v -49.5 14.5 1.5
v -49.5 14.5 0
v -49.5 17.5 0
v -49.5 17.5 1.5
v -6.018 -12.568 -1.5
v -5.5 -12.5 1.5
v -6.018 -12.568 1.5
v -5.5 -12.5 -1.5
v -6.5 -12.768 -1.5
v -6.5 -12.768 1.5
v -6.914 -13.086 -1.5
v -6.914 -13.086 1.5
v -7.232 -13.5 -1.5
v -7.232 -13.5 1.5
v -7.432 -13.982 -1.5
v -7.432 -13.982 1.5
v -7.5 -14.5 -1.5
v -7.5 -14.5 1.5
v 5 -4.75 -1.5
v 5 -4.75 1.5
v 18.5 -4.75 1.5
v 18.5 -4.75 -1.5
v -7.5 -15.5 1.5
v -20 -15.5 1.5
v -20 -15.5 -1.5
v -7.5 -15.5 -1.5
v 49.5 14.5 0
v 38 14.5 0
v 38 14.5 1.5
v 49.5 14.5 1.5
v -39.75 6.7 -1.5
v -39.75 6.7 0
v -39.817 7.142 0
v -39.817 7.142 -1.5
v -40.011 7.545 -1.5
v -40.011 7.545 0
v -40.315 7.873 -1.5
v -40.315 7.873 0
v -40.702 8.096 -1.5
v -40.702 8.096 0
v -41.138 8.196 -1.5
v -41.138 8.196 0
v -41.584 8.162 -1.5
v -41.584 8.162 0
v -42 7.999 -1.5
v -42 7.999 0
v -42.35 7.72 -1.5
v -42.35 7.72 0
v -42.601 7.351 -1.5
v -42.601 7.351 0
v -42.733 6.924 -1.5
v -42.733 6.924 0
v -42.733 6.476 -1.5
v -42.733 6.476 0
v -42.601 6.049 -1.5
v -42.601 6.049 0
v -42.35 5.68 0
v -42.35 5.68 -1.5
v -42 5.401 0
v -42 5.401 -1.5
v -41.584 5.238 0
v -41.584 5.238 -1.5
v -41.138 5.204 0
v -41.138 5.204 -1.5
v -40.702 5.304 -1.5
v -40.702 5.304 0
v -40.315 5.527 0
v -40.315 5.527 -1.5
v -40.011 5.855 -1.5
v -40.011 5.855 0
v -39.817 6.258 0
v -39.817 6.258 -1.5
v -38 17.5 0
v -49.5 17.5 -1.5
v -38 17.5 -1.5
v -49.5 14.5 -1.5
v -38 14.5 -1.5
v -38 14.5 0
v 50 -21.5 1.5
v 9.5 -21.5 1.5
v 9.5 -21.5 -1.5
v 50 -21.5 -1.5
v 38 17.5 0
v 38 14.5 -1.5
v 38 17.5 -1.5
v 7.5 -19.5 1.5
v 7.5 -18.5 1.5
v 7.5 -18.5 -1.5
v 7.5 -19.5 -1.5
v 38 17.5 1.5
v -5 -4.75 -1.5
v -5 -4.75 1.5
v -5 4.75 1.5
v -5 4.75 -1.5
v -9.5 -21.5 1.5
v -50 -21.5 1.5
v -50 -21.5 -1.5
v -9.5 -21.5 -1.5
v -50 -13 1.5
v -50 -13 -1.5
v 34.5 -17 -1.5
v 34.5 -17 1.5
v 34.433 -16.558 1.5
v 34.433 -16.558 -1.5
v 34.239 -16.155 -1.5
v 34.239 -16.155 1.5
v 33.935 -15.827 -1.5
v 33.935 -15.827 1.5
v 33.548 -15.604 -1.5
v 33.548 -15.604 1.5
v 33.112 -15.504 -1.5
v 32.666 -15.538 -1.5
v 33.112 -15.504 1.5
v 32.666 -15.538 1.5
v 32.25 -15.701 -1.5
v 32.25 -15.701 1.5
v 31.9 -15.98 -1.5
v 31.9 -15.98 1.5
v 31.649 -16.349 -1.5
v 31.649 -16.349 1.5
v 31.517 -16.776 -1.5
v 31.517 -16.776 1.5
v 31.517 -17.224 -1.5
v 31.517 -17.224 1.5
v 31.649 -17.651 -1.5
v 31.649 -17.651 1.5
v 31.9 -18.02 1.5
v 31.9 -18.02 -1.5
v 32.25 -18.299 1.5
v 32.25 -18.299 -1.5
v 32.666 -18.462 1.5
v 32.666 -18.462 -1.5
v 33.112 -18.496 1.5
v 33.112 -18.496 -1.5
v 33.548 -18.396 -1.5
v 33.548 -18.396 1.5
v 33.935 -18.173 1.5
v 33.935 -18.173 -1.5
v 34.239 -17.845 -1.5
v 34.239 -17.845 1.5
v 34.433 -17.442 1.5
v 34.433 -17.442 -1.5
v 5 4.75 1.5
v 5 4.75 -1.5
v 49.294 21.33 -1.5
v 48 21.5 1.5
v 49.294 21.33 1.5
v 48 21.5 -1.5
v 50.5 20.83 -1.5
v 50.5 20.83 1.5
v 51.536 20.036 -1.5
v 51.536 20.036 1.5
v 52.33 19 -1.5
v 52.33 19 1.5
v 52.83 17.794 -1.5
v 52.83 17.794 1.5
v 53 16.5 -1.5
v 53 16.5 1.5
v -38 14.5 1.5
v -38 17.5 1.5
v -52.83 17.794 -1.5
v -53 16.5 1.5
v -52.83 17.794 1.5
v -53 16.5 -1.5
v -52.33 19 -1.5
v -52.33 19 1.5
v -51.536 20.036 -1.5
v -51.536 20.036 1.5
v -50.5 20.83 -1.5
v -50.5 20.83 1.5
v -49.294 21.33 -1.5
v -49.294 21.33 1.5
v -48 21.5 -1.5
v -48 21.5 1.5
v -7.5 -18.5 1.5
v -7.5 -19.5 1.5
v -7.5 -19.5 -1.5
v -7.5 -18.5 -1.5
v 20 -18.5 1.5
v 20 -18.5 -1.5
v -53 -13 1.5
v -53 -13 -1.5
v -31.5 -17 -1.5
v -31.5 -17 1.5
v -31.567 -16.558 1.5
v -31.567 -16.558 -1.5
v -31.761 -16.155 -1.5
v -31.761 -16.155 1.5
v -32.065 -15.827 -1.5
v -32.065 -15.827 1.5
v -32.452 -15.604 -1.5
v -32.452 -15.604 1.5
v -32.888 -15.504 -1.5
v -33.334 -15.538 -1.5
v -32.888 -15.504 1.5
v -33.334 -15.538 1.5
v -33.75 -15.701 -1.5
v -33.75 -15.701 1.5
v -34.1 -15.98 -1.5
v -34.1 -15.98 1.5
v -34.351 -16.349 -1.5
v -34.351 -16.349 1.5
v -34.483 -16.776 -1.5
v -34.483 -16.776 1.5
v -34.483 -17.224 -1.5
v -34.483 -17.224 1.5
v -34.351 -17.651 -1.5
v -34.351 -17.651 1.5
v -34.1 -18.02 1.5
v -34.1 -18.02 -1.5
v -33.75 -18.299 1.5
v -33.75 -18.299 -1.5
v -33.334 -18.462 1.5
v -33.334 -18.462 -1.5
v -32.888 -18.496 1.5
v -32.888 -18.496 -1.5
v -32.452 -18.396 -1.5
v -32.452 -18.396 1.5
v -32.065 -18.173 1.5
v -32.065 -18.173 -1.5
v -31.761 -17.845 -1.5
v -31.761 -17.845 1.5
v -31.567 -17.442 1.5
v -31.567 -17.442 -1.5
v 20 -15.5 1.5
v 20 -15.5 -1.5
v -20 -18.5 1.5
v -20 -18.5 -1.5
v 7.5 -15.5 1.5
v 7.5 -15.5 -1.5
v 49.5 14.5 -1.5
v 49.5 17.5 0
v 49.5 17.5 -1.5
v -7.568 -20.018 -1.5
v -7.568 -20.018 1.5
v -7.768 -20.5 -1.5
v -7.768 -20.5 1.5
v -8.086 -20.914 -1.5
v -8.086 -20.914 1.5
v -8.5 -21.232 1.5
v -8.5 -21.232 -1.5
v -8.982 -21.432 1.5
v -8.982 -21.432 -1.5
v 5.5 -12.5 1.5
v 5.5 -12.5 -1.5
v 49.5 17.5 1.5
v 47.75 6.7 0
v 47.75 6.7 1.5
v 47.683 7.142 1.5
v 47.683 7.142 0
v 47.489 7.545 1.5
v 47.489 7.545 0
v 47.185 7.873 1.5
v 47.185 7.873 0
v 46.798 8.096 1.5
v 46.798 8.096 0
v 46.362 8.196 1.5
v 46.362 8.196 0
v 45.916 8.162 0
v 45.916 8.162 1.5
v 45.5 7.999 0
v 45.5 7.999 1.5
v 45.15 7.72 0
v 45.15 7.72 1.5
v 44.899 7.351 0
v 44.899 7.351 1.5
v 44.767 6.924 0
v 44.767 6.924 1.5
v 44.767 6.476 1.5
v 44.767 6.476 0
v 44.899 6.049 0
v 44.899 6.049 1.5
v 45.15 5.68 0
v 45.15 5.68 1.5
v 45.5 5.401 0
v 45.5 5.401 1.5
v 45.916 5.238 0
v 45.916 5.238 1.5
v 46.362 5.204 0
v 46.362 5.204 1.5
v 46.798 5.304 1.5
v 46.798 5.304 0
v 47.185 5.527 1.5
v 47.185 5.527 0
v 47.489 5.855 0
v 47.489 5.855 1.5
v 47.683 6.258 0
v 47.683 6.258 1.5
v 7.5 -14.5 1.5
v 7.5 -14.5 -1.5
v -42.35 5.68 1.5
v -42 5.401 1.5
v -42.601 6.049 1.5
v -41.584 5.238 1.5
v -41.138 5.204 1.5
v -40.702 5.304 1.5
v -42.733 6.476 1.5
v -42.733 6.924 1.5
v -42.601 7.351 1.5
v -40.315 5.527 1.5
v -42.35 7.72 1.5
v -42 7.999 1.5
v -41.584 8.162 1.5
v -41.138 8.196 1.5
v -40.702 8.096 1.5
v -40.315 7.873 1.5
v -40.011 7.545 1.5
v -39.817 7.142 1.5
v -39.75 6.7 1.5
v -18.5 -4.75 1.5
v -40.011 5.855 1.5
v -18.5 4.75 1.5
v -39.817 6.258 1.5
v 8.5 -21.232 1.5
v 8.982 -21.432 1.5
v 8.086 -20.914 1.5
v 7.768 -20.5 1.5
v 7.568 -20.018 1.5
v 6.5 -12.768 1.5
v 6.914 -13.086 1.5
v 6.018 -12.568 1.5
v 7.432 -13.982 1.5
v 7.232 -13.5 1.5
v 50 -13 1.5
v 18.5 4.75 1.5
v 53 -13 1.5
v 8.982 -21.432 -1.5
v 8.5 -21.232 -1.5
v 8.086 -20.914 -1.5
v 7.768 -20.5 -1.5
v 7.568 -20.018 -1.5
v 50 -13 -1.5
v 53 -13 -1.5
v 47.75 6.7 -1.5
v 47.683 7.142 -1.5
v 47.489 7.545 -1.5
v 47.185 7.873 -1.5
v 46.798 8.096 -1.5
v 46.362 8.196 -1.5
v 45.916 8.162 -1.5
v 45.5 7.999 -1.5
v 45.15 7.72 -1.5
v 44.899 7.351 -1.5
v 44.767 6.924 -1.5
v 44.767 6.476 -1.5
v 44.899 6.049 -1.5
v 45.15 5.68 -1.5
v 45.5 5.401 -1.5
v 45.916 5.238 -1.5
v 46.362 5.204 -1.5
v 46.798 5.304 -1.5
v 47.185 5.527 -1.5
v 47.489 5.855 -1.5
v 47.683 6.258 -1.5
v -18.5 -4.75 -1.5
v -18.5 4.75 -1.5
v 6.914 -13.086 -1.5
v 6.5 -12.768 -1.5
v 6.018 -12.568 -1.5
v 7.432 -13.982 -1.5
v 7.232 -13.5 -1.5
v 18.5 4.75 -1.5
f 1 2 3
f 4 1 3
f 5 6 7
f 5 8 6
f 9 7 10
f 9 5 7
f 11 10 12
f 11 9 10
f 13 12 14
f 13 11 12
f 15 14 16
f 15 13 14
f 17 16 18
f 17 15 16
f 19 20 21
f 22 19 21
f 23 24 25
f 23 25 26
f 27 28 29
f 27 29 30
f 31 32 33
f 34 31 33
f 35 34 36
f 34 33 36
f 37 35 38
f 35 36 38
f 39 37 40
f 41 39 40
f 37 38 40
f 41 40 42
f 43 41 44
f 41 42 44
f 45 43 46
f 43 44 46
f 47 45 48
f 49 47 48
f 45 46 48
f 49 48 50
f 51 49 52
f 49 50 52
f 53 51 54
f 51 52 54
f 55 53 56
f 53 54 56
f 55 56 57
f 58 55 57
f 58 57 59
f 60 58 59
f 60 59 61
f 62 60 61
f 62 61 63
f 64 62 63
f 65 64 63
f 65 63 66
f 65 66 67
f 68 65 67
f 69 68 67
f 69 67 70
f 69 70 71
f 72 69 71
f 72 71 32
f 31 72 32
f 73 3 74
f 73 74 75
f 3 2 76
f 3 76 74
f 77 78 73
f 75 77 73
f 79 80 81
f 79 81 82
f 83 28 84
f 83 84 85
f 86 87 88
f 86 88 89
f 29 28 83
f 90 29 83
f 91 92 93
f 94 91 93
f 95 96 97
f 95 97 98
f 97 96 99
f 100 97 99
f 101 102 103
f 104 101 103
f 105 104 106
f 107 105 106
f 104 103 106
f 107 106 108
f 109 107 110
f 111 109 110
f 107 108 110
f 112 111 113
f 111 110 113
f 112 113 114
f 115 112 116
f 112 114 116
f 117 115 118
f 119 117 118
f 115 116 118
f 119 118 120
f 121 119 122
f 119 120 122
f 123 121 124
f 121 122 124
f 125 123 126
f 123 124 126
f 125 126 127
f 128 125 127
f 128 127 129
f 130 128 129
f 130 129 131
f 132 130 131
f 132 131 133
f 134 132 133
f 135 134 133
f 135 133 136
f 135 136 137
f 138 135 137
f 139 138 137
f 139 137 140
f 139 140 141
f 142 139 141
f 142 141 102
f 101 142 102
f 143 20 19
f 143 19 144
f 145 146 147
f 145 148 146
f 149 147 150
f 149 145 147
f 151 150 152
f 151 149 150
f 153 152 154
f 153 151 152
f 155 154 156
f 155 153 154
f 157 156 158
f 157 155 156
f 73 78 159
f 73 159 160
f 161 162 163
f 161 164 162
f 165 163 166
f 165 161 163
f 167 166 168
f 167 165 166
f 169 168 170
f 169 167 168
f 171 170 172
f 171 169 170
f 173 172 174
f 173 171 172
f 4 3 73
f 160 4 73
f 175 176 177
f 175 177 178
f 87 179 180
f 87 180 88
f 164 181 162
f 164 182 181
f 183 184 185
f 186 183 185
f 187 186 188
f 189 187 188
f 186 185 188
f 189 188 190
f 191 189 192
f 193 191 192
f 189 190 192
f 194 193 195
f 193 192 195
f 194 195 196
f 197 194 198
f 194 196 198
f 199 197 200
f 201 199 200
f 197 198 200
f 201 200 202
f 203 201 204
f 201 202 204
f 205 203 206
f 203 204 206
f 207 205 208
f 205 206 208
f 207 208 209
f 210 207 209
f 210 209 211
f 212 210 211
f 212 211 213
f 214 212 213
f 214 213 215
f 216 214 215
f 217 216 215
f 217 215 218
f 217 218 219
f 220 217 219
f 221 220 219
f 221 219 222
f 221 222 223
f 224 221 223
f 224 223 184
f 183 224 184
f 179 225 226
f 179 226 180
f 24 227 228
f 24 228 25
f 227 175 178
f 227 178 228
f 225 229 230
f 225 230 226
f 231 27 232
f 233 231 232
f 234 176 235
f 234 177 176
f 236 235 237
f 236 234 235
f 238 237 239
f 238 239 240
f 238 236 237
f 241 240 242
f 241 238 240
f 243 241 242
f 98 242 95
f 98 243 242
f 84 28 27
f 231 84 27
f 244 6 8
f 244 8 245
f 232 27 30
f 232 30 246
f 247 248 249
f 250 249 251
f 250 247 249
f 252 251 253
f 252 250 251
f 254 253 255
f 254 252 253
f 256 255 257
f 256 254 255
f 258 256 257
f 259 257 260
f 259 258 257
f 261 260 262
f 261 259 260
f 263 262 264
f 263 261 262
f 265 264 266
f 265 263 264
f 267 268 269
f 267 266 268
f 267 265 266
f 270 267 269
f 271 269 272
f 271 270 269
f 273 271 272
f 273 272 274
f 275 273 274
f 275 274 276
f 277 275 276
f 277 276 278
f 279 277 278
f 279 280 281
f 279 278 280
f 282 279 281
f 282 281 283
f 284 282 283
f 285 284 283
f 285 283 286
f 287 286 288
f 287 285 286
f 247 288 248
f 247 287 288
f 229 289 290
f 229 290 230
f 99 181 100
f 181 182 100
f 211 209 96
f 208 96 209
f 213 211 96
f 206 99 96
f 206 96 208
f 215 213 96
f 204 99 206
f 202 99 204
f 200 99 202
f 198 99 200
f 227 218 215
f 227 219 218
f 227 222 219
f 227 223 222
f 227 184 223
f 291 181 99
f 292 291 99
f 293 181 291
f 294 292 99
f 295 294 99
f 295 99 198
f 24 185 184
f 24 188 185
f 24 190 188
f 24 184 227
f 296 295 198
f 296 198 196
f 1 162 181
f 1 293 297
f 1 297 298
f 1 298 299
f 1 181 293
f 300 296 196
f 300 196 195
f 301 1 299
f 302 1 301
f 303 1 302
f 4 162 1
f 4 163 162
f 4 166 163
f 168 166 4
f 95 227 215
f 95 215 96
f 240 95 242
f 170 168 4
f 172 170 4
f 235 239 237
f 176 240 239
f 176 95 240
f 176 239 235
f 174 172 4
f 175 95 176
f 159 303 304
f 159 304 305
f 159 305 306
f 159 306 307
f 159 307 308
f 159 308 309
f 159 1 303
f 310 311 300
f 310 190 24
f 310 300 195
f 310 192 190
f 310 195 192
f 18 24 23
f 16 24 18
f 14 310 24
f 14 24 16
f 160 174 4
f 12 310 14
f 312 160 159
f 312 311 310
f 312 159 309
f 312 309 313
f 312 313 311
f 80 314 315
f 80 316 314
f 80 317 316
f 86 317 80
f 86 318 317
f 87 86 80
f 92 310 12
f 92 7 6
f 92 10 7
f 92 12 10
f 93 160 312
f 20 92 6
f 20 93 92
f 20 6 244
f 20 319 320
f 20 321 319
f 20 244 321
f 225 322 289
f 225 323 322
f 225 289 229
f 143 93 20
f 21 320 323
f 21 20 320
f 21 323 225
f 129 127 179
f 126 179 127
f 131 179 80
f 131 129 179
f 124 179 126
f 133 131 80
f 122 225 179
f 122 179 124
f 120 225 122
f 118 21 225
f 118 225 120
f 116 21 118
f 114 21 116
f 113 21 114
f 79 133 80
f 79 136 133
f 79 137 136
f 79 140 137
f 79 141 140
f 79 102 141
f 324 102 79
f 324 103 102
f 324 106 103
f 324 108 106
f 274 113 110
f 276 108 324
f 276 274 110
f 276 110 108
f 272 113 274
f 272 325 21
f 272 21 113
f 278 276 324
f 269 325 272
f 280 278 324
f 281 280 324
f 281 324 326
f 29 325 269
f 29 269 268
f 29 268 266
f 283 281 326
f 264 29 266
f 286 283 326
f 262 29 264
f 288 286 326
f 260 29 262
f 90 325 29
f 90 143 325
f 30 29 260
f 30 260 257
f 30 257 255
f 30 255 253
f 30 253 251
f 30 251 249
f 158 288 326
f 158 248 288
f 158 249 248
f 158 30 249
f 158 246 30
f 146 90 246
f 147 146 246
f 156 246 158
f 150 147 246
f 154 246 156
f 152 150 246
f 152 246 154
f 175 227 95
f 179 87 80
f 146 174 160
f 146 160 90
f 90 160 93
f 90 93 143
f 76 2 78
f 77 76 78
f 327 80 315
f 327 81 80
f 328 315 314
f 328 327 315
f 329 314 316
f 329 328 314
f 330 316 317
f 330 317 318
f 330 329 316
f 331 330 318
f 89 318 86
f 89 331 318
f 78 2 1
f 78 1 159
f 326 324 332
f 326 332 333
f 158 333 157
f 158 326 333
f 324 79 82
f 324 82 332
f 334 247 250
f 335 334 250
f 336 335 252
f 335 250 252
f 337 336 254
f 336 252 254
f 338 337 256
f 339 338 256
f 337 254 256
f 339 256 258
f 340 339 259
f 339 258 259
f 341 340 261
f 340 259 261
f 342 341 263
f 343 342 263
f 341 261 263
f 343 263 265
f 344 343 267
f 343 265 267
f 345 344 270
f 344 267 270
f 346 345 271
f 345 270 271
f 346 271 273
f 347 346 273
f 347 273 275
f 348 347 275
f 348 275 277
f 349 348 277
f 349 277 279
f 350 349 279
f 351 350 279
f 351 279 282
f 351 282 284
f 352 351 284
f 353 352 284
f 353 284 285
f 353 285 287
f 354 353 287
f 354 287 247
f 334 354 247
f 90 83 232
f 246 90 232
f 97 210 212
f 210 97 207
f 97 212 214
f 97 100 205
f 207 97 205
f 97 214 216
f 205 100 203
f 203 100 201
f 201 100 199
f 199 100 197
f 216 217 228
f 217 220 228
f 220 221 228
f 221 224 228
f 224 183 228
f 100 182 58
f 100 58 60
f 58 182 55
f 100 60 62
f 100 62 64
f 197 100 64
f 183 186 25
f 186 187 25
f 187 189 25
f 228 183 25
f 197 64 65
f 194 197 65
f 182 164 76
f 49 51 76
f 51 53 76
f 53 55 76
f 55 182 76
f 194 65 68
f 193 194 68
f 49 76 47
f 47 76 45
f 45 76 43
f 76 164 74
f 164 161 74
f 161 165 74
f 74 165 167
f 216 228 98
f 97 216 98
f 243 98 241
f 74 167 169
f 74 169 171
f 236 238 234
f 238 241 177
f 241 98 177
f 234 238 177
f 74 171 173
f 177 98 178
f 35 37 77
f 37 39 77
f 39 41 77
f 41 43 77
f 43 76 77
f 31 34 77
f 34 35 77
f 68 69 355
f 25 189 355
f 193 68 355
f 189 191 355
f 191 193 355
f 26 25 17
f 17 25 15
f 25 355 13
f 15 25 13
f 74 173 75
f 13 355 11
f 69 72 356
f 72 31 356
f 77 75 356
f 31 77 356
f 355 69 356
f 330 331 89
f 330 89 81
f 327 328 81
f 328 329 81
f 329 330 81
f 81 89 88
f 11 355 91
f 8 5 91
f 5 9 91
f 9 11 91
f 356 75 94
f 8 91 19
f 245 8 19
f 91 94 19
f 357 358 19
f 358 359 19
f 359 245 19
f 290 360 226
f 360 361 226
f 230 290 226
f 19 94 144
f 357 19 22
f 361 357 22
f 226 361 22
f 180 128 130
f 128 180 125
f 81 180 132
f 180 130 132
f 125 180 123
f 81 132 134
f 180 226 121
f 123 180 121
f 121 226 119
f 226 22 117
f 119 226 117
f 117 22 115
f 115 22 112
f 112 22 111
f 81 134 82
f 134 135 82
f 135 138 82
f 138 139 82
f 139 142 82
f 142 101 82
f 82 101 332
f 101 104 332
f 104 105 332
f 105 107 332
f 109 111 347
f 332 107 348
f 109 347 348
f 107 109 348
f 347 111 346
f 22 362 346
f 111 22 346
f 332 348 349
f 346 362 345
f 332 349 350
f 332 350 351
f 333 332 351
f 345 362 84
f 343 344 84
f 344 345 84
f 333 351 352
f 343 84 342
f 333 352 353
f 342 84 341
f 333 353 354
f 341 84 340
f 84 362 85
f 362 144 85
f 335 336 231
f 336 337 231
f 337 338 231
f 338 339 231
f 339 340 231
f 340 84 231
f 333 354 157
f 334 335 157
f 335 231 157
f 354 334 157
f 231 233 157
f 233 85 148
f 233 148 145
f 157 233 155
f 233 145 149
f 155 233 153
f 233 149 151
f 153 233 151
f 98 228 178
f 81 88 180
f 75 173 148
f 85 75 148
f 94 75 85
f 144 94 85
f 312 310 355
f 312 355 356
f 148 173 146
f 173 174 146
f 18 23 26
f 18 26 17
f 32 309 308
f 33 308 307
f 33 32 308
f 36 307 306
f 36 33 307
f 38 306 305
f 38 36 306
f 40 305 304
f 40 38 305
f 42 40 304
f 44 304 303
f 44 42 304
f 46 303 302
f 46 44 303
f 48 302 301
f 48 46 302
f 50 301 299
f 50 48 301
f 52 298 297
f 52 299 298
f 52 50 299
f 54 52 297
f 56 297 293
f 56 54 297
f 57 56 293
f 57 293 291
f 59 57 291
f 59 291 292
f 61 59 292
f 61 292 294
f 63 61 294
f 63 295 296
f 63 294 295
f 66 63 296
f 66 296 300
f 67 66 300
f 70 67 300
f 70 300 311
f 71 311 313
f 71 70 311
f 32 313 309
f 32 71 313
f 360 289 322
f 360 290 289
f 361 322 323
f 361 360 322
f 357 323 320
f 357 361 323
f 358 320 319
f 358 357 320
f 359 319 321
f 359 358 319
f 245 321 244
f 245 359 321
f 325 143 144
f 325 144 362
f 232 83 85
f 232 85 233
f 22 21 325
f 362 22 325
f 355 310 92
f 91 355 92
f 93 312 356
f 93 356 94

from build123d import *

# Parameters (mm, degrees)
ESBO_O1_W                 = 100
ESBO_O1_H                 = 43
RESSALTO_EXTRUS_O1_DEPTH  = 1.5
ESBO_O2_R                 = 1.5
CORTE_EXTRUS_O1_DEPTH     = 4
SKETCH7_W                 = 13.5
SKETCH7_H                 = 9.5
CUT_EXTRUDE6_DEPTH        = 2.5
CUT_EXTRUDE6_DEPTH_BACK   = 2.5
SKETCH8_W                 = 3
SKETCH8_H                 = 34.5
BOSS_EXTRUDE1_DEPTH       = 1.5
FILLET3_R                 = 2
FILLET4_R                 = 5
SKETCH9_R                 = 1.5
SKETCH9_W                 = 11.5
SKETCH9_H                 = 3
CORTE_GY_53LDK_DEPTH      = 2.5
CORTE_GY_53LDK_DEPTH_BACK = 2.5


with BuildPart() as part:
    # Esboço1 → Ressalto-extrusão1 (new body, symmetric)
    with BuildSketch(Plane.XY):
        Rectangle(ESBO_O1_W, ESBO_O1_H)
    extrude(amount=RESSALTO_EXTRUS_O1_DEPTH, both=True)

    # Esboço2 → Corte-extrusão1 (cut, through all)
    with BuildSketch(Plane.XY.offset(1.5)):
        with Locations((-33, -17)):
            Circle(ESBO_O2_R)
        with Locations((33, -17)):
            Circle(ESBO_O2_R)
        Polygon((-20, -15.5), (-7.5, -15.5), (-7.5, -12.5), (7.5, -12.5), (7.5, -15.5), (20, -15.5), (20, -18.5), (7.5, -18.5), (7.5, -21.5), (-7.5, -21.5), (-7.5, -18.5), (-20, -18.5), align=None)
    extrude(amount=-CORTE_EXTRUS_O1_DEPTH, mode=Mode.SUBTRACT)

    # Sketch7 → Cut-Extrude6 (cut, two sides)
    with BuildSketch(Plane.XY) as cut_extrude6_sk:
        with Locations((-11.75, 0)):
            Rectangle(SKETCH7_W, SKETCH7_H)
        with Locations((11.75, 0)):
            Rectangle(SKETCH7_W, SKETCH7_H)
    extrude(amount=CUT_EXTRUDE6_DEPTH, mode=Mode.SUBTRACT)
    extrude(cut_extrude6_sk.sketch, amount=-CUT_EXTRUDE6_DEPTH_BACK, mode=Mode.SUBTRACT)

    # Sketch8 → Boss-Extrude1 (add, symmetric)
    with BuildSketch(Plane.XY):
        with Locations((-51.5, 4.25)):
            Rectangle(SKETCH8_W, SKETCH8_H)
        with Locations((51.5, 4.25)):
            Rectangle(SKETCH8_W, SKETCH8_H)
    extrude(amount=BOSS_EXTRUDE1_DEPTH, both=True)

    # Fillet3
    fillet3_edges = [part.edges().sort_by_distance(p)[0] for p in [
        (-7.5, -21.5, 0),
        (-7.5, -12.5, 0),
        (7.5, -12.5, 0),
        (7.5, -21.5, 0),
    ]]
    fillet(fillet3_edges, radius=FILLET3_R)

    # Fillet4
    fillet4_edges = [part.edges().sort_by_distance(p)[0] for p in [
        (53, 21.5, 0),
        (-53, 21.5, 0),
    ]]
    fillet(fillet4_edges, radius=FILLET4_R)

    # Sketch9 → Corte Gy-53LDK (cut, two sides)
    with BuildSketch(Plane.XY) as corte_gy_53ldk_sk:
        with Locations((-41.25, 6.7)):
            Circle(SKETCH9_R)
        with Locations((46.25, 6.7)):
            Circle(SKETCH9_R)
        with Locations((-43.75, 16)):
            Rectangle(SKETCH9_W, SKETCH9_H)
        with Locations((43.75, 16)):
            Rectangle(SKETCH9_W, SKETCH9_H)
    extrude(amount=CORTE_GY_53LDK_DEPTH, mode=Mode.SUBTRACT)
    extrude(corte_gy_53ldk_sk.sketch, amount=-CORTE_GY_53LDK_DEPTH_BACK, mode=Mode.SUBTRACT)


solid = part.part
